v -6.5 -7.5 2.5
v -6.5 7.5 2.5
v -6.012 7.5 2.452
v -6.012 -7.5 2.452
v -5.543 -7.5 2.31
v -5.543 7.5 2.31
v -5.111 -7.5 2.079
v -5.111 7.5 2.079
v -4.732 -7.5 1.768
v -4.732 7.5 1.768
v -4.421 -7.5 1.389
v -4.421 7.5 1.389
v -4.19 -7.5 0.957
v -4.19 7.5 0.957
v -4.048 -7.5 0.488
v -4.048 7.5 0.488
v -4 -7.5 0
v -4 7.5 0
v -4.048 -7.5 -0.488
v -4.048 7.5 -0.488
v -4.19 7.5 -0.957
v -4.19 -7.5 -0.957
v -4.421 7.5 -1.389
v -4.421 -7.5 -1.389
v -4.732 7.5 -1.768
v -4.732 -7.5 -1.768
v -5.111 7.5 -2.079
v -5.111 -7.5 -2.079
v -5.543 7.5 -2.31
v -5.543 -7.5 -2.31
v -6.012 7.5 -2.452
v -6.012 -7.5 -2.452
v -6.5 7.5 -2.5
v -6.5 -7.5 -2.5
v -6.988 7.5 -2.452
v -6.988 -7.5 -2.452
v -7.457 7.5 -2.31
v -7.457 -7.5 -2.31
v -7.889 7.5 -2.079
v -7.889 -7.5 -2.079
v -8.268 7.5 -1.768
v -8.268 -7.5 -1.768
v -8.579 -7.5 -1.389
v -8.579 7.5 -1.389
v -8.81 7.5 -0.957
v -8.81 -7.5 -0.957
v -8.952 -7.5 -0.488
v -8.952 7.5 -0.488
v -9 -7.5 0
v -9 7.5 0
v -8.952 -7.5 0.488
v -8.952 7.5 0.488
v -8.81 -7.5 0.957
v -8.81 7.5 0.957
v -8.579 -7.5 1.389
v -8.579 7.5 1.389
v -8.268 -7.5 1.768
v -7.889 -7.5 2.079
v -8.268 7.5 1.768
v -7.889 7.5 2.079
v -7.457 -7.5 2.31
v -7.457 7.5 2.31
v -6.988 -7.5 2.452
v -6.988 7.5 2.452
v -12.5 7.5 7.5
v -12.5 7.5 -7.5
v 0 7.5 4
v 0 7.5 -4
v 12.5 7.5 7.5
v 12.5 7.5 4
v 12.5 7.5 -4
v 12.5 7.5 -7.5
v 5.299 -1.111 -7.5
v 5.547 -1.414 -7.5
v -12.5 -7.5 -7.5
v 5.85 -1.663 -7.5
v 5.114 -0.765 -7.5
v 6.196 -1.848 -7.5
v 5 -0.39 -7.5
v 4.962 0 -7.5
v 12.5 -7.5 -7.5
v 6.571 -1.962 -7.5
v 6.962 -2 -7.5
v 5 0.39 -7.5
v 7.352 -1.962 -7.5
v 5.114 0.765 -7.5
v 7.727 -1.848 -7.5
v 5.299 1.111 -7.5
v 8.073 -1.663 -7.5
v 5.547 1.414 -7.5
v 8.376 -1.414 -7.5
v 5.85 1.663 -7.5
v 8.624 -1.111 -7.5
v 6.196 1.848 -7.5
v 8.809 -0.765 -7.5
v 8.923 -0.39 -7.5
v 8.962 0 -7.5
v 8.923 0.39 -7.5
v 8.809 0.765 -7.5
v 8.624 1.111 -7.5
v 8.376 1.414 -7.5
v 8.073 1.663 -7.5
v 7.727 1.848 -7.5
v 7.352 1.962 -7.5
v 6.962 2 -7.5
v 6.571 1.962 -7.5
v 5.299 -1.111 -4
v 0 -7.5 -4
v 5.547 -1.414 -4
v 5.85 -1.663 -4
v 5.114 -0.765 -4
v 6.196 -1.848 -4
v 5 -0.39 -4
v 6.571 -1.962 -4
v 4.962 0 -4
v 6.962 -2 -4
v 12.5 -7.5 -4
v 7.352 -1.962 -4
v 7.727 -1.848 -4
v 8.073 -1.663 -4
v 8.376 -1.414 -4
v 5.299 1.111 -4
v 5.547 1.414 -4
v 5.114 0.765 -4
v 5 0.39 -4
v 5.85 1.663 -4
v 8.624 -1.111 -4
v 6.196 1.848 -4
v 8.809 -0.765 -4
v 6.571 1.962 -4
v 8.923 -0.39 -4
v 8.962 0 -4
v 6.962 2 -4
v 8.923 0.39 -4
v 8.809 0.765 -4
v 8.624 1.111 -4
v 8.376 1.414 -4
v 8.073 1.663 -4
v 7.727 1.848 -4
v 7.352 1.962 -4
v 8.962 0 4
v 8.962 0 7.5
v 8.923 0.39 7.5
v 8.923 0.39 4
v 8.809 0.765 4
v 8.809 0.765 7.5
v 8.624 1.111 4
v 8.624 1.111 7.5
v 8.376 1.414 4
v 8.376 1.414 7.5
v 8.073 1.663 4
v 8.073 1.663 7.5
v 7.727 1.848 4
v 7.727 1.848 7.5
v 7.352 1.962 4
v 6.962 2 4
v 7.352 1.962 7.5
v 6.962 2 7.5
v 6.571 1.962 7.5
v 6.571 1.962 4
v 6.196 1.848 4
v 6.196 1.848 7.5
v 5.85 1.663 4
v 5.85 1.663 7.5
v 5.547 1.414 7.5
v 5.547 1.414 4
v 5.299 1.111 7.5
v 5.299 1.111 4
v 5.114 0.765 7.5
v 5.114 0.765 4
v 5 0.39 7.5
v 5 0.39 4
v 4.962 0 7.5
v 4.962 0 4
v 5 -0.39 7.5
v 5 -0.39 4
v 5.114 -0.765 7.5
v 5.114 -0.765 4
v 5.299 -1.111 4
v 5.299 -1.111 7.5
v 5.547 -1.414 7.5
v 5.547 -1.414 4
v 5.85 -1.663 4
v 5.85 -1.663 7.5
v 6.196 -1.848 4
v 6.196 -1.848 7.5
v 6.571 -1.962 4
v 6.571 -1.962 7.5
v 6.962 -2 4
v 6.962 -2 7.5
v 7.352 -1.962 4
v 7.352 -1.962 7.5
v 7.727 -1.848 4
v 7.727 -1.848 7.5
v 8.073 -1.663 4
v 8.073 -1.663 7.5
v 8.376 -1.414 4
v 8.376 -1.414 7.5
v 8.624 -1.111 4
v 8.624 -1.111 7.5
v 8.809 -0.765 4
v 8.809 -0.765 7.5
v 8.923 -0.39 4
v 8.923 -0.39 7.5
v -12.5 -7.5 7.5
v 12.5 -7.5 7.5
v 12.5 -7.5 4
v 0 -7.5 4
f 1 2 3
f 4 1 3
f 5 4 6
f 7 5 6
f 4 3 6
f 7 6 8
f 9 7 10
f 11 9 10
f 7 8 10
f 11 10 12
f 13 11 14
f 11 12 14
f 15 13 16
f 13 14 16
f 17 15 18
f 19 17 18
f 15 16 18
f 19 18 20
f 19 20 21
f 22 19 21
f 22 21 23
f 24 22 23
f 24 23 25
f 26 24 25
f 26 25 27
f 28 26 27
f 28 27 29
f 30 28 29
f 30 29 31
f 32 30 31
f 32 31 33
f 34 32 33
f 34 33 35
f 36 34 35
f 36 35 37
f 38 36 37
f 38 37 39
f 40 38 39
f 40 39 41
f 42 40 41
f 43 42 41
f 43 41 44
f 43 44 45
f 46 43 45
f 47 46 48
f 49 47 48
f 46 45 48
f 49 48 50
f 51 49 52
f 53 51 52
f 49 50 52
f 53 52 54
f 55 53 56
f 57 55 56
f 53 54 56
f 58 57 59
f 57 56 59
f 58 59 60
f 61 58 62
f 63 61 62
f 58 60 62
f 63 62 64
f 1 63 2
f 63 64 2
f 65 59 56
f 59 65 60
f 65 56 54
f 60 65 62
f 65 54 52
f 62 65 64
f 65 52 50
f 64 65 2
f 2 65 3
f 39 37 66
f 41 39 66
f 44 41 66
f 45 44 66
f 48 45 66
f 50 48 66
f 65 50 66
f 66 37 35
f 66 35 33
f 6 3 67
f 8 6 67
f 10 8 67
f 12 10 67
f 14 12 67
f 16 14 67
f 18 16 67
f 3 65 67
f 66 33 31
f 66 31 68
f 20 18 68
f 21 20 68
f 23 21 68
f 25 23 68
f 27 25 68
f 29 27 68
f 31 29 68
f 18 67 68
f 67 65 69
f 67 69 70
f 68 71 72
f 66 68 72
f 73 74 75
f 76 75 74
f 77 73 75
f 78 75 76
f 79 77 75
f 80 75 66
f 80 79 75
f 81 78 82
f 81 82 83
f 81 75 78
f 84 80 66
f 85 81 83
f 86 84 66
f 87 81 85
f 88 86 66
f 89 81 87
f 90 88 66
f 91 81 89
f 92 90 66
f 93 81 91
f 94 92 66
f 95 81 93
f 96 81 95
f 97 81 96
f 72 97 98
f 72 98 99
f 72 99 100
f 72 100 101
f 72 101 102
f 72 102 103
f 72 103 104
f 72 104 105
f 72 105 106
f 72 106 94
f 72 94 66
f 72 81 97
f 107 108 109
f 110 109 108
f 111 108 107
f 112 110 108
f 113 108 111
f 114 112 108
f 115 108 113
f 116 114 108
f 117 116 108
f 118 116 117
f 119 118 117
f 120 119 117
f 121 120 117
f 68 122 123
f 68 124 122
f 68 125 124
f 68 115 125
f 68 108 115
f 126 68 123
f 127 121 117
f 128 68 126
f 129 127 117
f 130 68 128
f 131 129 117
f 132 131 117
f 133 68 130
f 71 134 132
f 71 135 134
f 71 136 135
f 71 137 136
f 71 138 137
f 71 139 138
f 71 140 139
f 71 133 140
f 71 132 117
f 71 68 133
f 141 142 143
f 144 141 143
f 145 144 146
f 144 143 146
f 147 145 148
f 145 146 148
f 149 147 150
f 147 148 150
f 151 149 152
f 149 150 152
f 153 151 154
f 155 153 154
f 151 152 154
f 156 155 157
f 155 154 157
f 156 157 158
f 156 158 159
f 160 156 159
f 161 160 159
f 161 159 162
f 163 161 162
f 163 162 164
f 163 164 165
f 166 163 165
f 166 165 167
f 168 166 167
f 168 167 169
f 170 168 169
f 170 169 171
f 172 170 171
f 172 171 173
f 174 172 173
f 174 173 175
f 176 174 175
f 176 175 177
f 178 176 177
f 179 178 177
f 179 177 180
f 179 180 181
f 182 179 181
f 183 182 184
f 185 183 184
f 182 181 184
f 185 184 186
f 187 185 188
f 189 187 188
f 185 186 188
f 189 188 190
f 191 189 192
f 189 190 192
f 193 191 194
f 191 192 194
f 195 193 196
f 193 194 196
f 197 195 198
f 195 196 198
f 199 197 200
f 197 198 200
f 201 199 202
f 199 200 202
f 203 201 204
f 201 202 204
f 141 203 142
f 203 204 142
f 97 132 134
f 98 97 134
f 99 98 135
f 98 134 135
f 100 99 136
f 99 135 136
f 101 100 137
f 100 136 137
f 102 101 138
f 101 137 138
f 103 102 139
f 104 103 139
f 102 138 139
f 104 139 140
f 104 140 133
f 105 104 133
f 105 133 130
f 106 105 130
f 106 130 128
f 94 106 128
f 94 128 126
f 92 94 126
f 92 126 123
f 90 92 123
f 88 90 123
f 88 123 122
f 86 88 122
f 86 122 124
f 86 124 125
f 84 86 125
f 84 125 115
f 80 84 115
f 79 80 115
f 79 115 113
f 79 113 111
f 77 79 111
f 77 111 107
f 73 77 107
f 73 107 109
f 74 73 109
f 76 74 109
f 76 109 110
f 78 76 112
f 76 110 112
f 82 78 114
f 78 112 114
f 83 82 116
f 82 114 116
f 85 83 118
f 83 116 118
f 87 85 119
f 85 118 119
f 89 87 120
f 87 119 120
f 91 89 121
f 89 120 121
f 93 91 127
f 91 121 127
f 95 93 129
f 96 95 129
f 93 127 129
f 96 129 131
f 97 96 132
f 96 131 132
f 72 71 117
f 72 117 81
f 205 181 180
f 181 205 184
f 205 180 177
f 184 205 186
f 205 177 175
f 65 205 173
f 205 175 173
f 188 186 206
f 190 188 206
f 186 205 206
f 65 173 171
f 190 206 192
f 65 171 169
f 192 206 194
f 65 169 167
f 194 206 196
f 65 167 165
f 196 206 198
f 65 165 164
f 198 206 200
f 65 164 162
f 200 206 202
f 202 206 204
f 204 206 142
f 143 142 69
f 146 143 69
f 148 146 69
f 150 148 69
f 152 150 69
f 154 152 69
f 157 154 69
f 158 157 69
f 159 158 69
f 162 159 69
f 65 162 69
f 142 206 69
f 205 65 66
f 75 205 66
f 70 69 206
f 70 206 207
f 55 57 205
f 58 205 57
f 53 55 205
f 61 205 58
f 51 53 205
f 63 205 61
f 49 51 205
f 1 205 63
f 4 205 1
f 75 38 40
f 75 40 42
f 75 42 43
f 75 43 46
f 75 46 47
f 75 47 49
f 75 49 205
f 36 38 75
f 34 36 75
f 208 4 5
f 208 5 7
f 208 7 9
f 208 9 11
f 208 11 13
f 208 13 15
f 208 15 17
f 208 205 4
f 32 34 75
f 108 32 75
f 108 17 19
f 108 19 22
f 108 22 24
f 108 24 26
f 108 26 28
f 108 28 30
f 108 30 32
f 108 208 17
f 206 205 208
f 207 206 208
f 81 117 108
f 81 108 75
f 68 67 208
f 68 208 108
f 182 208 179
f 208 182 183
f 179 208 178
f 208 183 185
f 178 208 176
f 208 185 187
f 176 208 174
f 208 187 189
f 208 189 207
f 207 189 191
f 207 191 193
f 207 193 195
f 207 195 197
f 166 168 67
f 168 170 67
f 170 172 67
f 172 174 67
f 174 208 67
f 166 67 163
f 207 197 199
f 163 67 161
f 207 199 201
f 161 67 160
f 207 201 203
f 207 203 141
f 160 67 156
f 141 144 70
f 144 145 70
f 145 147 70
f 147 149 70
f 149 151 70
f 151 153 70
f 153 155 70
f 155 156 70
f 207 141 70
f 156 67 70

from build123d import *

# Parameters (mm, degrees)
CROQUIS1_W              = 15
CROQUIS1_H              = 15
SALIENTE_EXTRUIR1_DEPTH = 12.5
CROQUIS2_R              = 2.5
CROQUIS2_W              = 25
CROQUIS2_H              = 8
CORTAR_EXTRUIR1_DEPTH   = 21.916500663
CROQUIS3_R              = 2
CORTAR_EXTRUIR2_DEPTH   = 21.916500663


with BuildPart() as part:
    # Croquis1 → Saliente-Extruir1 (new, symmetric)
    with BuildSketch(Plane(origin=(0, 0, 0), x_dir=(0, 0, -1), z_dir=(1, 0, 0))):
        Rectangle(CROQUIS1_W, CROQUIS1_H)
    extrude(amount=SALIENTE_EXTRUIR1_DEPTH, both=True)

    # Croquis2 → Cortar-Extruir1 (cut, through all)
    with BuildSketch(Plane(origin=(0, 7.5, 0), x_dir=(1, 0, 0), z_dir=(0, 1, 0))):
        with Locations(Location((-6.5, 0, 0), (0, 0, 270))):
            Circle(CROQUIS2_R)
        with Locations((12.5, 0)):
            Rectangle(CROQUIS2_W, CROQUIS2_H)
    extrude(amount=-CORTAR_EXTRUIR1_DEPTH, mode=Mode.SUBTRACT)

    # Croquis3 → Cortar-Extruir2 (cut, through all)
    with BuildSketch(Plane.XY.offset(7.5)):
        with Locations((6.961549082, 0)):
            Circle(CROQUIS3_R)
    extrude(amount=-CORTAR_EXTRUIR2_DEPTH, mode=Mode.SUBTRACT)


solid = part.part
